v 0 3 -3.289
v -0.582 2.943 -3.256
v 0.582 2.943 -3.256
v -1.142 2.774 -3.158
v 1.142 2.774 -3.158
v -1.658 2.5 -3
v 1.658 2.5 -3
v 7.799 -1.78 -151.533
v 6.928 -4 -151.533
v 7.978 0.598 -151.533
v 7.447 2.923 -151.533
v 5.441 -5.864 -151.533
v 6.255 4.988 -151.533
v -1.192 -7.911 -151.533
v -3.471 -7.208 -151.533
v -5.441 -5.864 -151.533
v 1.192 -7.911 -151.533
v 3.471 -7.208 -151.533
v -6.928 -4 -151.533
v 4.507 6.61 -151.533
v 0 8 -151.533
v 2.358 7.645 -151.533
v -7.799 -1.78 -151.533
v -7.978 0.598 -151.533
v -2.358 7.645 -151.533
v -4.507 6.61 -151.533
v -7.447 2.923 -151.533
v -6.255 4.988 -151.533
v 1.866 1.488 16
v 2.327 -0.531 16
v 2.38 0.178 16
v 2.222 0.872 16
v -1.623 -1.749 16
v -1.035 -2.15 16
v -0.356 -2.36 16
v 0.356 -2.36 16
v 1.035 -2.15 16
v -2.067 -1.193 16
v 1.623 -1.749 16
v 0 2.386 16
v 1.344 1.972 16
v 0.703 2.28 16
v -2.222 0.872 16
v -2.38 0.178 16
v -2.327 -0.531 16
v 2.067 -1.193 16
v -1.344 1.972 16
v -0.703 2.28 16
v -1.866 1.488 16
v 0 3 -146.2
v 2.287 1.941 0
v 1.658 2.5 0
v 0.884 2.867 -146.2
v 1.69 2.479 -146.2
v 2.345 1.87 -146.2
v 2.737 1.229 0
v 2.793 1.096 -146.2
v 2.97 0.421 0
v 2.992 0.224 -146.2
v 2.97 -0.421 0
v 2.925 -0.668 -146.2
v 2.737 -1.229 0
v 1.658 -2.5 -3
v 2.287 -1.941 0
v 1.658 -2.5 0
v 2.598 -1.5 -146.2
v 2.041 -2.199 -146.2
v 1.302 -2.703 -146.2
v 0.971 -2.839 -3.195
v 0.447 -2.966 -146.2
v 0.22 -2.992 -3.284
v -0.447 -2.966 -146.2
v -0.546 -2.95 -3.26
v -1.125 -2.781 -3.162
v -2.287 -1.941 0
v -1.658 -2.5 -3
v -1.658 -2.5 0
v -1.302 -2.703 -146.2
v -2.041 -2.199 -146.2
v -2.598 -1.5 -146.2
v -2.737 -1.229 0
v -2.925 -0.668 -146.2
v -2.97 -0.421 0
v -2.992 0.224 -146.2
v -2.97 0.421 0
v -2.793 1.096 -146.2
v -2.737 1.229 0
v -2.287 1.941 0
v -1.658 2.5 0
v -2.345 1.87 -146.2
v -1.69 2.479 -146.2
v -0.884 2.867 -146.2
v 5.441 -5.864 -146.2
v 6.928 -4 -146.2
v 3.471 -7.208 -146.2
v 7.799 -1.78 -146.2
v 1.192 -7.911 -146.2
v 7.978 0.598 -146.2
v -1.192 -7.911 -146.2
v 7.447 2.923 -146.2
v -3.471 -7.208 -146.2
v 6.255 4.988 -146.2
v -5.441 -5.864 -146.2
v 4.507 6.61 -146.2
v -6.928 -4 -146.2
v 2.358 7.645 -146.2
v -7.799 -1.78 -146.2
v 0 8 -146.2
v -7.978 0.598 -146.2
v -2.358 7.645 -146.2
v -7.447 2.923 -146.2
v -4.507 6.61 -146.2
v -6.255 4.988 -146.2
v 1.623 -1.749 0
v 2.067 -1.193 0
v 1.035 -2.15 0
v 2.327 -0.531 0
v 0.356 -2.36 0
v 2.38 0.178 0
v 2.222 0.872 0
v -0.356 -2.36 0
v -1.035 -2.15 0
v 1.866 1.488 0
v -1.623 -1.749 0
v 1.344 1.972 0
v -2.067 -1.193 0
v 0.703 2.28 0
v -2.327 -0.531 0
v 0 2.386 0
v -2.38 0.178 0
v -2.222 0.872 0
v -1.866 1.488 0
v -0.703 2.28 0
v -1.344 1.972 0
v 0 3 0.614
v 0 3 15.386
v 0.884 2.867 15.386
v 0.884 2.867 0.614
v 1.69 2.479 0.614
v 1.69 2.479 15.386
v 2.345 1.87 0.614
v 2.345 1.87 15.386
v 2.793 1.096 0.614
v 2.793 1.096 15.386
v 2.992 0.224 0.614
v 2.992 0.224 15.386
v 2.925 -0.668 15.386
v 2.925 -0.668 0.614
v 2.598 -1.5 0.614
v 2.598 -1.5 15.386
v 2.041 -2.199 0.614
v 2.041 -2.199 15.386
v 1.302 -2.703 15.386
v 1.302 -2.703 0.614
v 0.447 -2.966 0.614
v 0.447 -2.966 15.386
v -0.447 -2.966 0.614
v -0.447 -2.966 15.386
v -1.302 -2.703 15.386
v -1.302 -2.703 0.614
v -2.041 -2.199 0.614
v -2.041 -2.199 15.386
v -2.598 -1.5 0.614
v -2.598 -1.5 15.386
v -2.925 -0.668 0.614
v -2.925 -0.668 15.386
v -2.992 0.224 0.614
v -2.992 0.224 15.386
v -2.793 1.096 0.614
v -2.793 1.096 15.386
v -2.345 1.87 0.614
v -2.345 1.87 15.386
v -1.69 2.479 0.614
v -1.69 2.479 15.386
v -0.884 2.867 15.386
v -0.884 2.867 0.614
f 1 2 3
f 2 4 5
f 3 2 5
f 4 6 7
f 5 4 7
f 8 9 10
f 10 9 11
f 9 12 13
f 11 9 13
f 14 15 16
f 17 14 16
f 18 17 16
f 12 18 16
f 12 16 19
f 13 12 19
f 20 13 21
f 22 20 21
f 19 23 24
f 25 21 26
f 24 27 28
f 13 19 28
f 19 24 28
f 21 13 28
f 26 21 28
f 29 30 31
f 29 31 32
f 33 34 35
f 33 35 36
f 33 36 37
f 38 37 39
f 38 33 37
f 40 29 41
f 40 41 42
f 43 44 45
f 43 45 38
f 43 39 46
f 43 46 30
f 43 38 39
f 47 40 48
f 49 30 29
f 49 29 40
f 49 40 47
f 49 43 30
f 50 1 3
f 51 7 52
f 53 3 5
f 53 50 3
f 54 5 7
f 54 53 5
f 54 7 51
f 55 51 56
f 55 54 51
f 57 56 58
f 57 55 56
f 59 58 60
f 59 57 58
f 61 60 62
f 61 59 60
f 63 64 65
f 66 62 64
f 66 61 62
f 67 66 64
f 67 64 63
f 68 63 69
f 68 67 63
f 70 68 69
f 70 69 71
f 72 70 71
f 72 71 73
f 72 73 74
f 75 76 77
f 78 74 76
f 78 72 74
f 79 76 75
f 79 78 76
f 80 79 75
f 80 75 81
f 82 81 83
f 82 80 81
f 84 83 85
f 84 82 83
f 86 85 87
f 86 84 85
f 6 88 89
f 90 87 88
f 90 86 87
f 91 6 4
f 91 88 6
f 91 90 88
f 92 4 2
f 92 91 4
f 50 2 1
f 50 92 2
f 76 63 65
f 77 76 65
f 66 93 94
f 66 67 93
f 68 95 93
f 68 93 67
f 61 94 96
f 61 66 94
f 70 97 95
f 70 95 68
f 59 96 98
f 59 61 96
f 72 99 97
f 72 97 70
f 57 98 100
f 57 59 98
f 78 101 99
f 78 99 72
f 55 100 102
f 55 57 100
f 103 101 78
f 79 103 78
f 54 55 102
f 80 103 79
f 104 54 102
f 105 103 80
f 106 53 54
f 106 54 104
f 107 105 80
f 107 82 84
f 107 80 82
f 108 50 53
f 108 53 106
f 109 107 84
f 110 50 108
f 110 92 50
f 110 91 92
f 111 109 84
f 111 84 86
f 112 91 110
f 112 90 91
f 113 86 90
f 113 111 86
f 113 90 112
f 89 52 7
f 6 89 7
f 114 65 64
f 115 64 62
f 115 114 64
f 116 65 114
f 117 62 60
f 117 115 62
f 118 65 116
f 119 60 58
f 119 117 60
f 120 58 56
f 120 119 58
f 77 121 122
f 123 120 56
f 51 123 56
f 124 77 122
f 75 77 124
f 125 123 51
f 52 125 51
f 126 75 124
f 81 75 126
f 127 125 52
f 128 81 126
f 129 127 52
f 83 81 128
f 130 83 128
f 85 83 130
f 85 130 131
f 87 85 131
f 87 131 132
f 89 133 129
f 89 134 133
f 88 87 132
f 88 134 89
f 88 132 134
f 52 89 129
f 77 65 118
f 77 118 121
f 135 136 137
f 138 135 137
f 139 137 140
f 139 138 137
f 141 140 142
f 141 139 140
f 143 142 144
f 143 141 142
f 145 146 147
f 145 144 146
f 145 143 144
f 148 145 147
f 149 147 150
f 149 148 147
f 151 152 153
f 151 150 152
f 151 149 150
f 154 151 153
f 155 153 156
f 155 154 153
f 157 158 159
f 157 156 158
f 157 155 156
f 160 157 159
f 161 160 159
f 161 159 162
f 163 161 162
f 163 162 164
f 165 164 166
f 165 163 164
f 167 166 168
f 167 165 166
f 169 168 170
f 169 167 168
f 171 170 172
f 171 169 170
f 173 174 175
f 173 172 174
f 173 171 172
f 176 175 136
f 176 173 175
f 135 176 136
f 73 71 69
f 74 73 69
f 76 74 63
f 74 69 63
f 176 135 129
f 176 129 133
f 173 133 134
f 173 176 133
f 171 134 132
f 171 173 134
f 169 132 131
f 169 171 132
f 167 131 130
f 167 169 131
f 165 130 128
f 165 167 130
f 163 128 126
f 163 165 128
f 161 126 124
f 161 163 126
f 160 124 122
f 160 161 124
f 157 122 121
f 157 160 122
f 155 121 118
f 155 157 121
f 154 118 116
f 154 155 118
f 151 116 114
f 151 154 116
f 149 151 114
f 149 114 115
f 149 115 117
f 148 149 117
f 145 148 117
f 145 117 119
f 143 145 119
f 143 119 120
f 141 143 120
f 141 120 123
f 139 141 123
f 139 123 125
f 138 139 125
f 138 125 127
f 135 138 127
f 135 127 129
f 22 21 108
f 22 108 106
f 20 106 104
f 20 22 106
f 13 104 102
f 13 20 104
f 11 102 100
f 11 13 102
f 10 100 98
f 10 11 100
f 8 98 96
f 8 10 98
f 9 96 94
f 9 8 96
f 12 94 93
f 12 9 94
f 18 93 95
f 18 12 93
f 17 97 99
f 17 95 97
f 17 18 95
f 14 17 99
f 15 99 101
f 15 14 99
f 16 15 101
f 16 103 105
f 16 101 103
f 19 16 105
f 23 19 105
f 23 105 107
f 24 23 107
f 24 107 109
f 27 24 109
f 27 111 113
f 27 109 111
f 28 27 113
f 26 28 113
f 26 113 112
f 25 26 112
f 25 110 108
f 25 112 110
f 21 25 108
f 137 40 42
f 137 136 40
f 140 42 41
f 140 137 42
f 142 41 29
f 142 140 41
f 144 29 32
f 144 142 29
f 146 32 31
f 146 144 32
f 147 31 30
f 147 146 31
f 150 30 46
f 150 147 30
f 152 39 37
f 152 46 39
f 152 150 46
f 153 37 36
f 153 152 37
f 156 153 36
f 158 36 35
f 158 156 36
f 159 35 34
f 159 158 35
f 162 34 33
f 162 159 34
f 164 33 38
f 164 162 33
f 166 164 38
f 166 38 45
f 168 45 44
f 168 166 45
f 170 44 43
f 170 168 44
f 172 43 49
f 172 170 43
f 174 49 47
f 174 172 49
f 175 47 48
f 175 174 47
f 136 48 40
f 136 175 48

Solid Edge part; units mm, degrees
sketch "Sketch1" plane through (0, 0, 0) normal (1, 0, 0) x (0, 1, 0)
  line L0 (0, 0) -> (3, 0)
  line L1 (3, 0) -> (3, -146.2)
  line L2 (3, -146.2) -> (8, -146.2)
  line L3 (8, -146.2) -> (8, -151.5333)
  line L4 (8, -151.5333) -> (0, -151.5333)
  line L5 (0, -151.5333) -> (0, 0)
revolve "RevolvedProtrusion1" add sketch "Sketch1" angle 360 about axis through (0, 0, -151.5333) along (0, 0, 1)
sketch "Sketch2" plane through (0, 0, 0) normal (1, 0, 0) x (0, 1, 0)
  line L0 (5, 2) -> (-5, 2)
  line L1 (-5, 2) -> (-5, -4.4434)
  line L2 (-5, -4.4434) -> (-2.5, -3)
  line L3 (-2.5, -3) -> (-2.5, 0)
  line L4 (-2.5, 0) -> (2.5, 0)
  line L5 (2.5, 0) -> (2.5, -3)
  line L6 (2.5, -3) -> (5, -4.4434)
  line L7 (5, -4.4434) -> (5, 2)
extrude "ExtrudedCutout_1" cut sketch "Sketch2" against normal blind 3 and the other way blind 3
sketch "Sketch3" plane through (0, 0, 0) normal (1, 0, 0) x (0, 1, 0)
  line L0 (0, 16) -> (2.3865, 16)
  line L1 (2.3865, 16) -> (3, 15.3865)
  line L2 (3, 15.3865) -> (3, 0.6135)
  line L3 (3, 0.6135) -> (2.3865, 0)
  line L4 (2.3865, 0) -> (0, 0)
  line L5 (0, 0) -> (0, 16)
revolve "RevolvedProtrusion2" add sketch "Sketch3" angle 360 about axis through (0, 0, 0) along (0, 0, 1)
properties part number "BumbleB0479"
